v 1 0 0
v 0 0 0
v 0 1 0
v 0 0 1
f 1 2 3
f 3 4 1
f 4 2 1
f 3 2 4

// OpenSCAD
// polyhedron() faces: invalid faces are dropped; triangles= is not accepted.
polyhedron(points=[[0,0,0],[1,0,0],[0,1,0],[0,0,1]], triangles=[[0,1,2],[0,3,1],[0,2,3],[1,3,2]]);
polyhedron(points=[[0,0,0],[1,0,0],[0,1,0],[0,0,1]], faces=[[0,1,2],[0,3,1],[0,2,3],[1,3,2]], triangles=[[0,1,2]]);
polyhedron(points=[[0,0,0],[1,0,0],[0,1,0],[0,0,1]]);
polyhedron(points=[[0,0,0],[1,0,0],[0,1,0],[0,0,1]], faces=5);
polyhedron(points=[[0,0,0],[1,0,0],[0,1,0],[0,0,1]], faces=[[0,1,"a"],[0,2,3]]);
polyhedron(points=[[0,0,0],[1,0,0],[0,1,0],[0,0,1]], faces=[1,[0,1,2]]);
polyhedron(points=[[0,0,0],[1,0,0],[0,1,0],[0,0,1]], faces=[[0,1,-2]]);
polyhedron(points=[[0,0,0],[1,0,0],[0,1,0],[0,0,1]], faces=[[0,1,2.7],[0,1,4]]);
polyhedron(points=[]);
polyhedron(points=undef, faces=[[0]]);
polyhedron(points=7);
